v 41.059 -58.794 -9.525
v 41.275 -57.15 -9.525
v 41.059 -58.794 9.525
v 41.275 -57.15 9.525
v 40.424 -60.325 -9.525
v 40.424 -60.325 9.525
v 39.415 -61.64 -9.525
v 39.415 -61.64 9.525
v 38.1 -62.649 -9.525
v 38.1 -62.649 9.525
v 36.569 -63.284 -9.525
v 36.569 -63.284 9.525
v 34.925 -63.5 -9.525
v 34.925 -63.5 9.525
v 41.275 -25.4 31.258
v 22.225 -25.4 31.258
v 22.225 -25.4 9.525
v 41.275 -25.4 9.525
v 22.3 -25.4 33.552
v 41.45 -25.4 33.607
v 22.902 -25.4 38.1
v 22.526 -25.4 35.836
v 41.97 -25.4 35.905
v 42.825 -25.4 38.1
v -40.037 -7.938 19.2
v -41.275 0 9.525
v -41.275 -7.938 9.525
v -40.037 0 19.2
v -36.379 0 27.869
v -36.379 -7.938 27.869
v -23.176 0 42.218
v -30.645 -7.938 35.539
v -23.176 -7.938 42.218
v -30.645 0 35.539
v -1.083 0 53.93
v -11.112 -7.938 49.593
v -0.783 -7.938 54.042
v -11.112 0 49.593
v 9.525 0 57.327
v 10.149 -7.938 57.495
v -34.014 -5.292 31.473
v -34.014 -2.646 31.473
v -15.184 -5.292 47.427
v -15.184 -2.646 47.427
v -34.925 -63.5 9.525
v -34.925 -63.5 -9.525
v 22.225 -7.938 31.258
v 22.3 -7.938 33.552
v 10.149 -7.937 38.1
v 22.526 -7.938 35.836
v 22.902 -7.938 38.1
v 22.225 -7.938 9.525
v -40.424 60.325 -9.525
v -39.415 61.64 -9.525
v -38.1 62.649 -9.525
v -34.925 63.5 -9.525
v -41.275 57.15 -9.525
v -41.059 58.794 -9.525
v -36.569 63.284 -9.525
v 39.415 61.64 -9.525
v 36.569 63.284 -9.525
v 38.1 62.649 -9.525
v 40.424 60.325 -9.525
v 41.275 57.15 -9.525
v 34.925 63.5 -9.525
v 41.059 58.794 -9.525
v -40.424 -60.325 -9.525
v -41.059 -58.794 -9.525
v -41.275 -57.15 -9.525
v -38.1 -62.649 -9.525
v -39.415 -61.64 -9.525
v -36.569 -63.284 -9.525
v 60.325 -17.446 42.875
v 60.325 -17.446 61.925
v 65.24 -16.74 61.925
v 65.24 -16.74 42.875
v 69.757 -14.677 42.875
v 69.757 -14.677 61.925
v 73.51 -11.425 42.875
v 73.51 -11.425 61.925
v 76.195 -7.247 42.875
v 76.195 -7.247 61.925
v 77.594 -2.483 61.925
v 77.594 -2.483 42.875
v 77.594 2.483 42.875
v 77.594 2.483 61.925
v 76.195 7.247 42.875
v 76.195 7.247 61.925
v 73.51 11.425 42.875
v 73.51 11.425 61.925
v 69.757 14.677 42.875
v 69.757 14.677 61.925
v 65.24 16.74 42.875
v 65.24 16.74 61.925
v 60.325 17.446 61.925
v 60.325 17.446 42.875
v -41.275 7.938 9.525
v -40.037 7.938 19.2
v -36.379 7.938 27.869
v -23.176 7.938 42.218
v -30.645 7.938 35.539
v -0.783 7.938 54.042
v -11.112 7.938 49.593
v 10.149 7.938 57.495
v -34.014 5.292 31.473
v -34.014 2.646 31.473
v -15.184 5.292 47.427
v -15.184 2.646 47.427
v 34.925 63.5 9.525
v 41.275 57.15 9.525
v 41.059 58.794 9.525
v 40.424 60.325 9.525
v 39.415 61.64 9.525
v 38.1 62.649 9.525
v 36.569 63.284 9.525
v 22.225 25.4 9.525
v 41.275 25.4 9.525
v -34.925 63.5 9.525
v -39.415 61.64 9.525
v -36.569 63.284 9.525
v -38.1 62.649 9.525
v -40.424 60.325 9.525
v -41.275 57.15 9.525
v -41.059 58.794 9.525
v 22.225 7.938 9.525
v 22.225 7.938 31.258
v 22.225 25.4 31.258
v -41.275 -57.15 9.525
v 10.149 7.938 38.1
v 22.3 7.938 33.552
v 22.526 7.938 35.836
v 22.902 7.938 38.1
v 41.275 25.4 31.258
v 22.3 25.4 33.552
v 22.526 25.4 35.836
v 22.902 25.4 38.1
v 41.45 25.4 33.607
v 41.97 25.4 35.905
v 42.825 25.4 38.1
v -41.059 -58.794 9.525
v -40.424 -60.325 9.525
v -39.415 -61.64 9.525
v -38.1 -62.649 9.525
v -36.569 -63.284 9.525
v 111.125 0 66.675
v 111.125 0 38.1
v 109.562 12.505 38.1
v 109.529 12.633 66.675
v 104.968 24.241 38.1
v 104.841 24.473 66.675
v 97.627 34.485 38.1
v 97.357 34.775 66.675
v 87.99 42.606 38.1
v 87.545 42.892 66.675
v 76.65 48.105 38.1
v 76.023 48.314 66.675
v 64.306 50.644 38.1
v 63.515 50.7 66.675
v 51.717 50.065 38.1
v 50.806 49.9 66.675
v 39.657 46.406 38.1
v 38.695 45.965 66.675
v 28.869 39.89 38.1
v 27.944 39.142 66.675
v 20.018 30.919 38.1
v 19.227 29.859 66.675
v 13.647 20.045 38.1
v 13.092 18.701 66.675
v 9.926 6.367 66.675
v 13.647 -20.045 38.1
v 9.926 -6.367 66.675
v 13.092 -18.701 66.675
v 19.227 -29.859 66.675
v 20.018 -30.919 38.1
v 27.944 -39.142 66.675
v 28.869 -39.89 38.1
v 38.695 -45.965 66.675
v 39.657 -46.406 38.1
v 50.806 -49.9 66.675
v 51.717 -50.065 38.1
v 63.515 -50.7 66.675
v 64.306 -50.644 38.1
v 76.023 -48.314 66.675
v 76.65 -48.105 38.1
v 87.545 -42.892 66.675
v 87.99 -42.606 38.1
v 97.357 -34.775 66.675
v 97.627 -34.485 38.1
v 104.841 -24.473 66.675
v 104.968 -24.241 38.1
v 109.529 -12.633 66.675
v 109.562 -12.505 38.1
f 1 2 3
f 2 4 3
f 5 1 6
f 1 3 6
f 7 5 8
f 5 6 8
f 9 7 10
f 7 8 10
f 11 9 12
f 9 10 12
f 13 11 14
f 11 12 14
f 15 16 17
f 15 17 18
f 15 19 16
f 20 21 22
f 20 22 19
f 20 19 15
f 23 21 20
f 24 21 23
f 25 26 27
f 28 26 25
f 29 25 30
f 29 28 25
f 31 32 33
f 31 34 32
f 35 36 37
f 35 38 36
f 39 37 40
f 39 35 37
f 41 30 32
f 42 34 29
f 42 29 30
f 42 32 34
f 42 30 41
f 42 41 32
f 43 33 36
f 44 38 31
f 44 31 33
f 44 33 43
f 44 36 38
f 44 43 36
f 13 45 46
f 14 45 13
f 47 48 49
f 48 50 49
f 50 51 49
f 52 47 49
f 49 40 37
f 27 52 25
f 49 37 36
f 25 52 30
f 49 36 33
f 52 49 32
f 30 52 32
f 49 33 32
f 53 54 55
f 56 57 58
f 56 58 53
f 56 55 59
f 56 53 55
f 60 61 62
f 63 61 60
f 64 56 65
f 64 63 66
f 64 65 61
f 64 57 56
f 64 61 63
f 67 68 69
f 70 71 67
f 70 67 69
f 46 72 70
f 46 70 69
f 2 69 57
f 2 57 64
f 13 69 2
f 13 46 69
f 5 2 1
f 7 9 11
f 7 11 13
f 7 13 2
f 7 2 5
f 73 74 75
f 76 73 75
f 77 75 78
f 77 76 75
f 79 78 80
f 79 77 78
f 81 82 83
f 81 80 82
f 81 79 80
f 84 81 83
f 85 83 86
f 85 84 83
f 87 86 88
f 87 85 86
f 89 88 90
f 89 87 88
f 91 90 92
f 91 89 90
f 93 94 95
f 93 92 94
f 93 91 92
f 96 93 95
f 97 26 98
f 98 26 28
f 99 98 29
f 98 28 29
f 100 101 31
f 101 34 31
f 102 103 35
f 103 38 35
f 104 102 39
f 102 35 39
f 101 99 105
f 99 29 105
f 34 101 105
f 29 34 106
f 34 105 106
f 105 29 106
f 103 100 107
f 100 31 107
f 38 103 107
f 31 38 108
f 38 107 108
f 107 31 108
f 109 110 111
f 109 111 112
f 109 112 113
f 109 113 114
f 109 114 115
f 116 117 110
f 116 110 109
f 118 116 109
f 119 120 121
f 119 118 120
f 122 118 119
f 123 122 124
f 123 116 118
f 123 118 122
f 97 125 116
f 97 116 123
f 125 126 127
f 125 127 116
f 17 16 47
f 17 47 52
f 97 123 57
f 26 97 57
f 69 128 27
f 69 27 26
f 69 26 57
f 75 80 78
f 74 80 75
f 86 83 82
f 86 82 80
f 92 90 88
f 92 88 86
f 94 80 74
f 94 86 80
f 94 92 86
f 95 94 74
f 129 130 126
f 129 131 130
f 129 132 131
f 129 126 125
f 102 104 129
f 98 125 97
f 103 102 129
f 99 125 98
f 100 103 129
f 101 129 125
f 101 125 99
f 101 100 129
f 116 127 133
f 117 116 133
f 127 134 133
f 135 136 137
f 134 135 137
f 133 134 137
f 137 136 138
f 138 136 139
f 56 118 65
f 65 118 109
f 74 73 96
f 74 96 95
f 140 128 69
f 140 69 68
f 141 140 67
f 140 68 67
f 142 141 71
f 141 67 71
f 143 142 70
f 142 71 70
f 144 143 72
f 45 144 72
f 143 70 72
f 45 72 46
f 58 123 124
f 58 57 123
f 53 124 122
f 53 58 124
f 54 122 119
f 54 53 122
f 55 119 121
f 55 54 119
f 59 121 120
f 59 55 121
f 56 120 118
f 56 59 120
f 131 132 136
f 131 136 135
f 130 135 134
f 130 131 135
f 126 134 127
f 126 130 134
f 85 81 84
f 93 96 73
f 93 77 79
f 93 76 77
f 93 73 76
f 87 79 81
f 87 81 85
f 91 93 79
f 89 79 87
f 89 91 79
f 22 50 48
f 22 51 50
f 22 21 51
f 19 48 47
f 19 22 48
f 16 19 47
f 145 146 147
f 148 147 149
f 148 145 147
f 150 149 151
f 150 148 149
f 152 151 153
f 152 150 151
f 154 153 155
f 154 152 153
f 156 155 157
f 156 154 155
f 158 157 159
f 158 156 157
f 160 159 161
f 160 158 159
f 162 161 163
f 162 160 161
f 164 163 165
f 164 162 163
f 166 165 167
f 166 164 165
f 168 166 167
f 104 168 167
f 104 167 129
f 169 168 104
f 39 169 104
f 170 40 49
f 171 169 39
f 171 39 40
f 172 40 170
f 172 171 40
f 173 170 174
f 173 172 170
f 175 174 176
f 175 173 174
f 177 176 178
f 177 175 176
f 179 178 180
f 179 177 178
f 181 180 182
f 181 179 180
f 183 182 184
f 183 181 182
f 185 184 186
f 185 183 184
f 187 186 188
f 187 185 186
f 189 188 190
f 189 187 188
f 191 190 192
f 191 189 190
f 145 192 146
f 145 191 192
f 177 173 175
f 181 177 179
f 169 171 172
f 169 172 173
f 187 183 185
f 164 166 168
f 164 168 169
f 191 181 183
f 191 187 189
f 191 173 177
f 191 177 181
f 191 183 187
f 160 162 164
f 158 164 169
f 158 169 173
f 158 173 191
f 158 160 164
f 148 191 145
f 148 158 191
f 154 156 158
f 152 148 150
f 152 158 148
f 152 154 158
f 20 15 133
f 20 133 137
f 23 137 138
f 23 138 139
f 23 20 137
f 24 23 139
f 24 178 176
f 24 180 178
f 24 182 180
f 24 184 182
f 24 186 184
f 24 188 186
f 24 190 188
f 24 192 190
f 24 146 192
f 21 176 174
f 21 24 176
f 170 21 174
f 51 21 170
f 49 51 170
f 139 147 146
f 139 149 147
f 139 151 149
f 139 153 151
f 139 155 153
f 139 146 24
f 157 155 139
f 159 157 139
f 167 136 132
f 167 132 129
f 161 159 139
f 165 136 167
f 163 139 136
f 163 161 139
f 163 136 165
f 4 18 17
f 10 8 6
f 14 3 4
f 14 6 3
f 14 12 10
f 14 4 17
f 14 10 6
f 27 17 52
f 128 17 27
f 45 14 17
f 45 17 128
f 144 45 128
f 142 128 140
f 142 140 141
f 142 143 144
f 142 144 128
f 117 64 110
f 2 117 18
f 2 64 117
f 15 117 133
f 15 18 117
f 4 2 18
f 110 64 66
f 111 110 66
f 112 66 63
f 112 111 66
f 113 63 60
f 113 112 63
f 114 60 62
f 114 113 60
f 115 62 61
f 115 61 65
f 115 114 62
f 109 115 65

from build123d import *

# Parameters (mm, degrees)
F1_DEPTH = 63.5
F2_DEPTH = 25.4
F3_DEPTH = 7.9375
F5_R     = 6.35


with BuildPart() as f1:
    # F0 (on Front) → F1 (new body, symmetric)
    with BuildSketch(Plane.XZ):
        Polygon((-41.275, 9.525), (-41.275, -9.525), (41.275, -9.525), (41.275, 9.525), (22.225, 9.525), align=None)
    extrude(amount=F1_DEPTH, both=True)

    # F0 (on Front) → F2 (join, symmetric)
    with BuildSketch(Plane.XZ):
        with BuildLine():
            Line((22.225, 9.525), (41.275, 9.525))
            Line((41.275, 9.525), (41.275, 31.257566))
            ThreePointArc((41.275, 31.257566), (42.593834, 37.59268), (46.33121, 42.8752))
            Line((46.33121, 42.8752), (60.325, 42.8752))
            Line((60.325, 42.8752), (60.325, 61.9252))
            Line((60.325, 61.9252), (40.43917, 61.9252))
            ThreePointArc((40.43917, 61.9252), (27.121835, 49.091941), (22.225, 31.257566))
            Line((22.225, 31.257566), (22.225, 9.525))
        make_face()
    extrude(amount=F2_DEPTH, both=True)

    # F0 (on Front) → F3 (join, symmetric)
    with BuildSketch(Plane.XZ):
        with BuildLine():
            add(Edge.make_bspline(
                [(-41.275, 9.525), (-41.567614, 43.979483), (5.612445, 61.028755), (40.43917, 61.9252)],
                knots=[0, 0, 0, 0, 97.072068, 97.072068, 97.072068, 97.072068], degree=3))
            Line((-41.275, 9.525), (22.225, 9.525))
            Line((22.225, 9.525), (22.225, 31.257566))
            ThreePointArc((22.225, 31.257566), (27.121835, 49.091941), (40.43917, 61.9252))
        make_face()
    extrude(amount=F3_DEPTH, both=True)

    # F0 (on Front) → F4 (revolve)
    with BuildSketch(Plane.XZ):
        Polygon((60.325, 66.675), (60.325, 61.9252), (77.771246, 61.9252), (77.771246, 42.8752), (60.325, 42.8752), (60.325, 38.1), (111.125, 38.1), (111.125, 66.675), align=None)
    revolve(axis=Axis((60.325, 0, 52.3875), (0, 0, 1)))

    # F5
    f5_edges = [f1.edges().sort_by_distance(p)[0] for p in [
        (-41.275, -63.5, 0),
        (41.275, -63.5, 0),
        (41.275, 63.5, 0),
        (-41.275, 63.5, 0),
    ]]
    fillet(f5_edges, radius=F5_R)


solid = f1.part
